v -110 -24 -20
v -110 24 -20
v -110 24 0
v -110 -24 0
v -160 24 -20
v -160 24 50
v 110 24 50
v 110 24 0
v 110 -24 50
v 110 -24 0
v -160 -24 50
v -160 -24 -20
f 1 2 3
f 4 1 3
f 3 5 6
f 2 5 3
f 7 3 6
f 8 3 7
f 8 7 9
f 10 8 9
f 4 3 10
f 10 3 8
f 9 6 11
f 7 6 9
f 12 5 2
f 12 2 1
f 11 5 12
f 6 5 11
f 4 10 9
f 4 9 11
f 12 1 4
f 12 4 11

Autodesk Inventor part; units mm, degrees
ref_plane "YZ Plane" through (0, 0, 0) normal (1, 0, 0) x (0, 1, 0)
ref_plane "XZ Plane" through (0, 0, 0) normal (0, 1, 0) x (-1, 0, 0)
ref_plane "XY Plane" through (0, 0, 0) normal (0, 0, 1) x (1, 0, 0)
sketch "Esboço1" plane through (0, 0, 0) normal (0, 0, 1) x (1, 0, 0)
  line L0 (-110, 24) -> (110, 24)
  line L1 (110, 24) -> (110, -24)
  line L2 (110, -24) -> (-110, -24)
  line L3 (-110, -24) -> (-110, 24)
  line L4 (-110, 24) -> (110, -24) construction
  line L5 (110, 24) -> (-110, -24) construction
  point P0 (0, 0)
  dimension "d0" = 220
  dimension "d1" = 48
extrude "Extrusão1" add sketch "Esboço1" along normal blind 50
sketch "Esboço2" plane through (-110, -24, 0) normal (-1, 0, 0) x (0, 0, 1)
  line L0 (50, 48) -> (50, 0) construction
  line L1 (0, 48) -> (50, 48) construction
  line L2 (50, 48) -> (50, 0) construction
  line L3 (50, 0) -> (0, 0) construction
  line L4 (0, 0) -> (0, 48) construction
  line L5 (0, 48) -> (50, 0) construction
  line L6 (50, 48) -> (0, 0) construction
  line L7 (0, 48) -> (-20, 48) construction
  line L8 (-20, 48) -> (-20, 0) construction
  line L9 (-20, 0) -> (0, 0) construction
  line L10 (-20, 24) -> (15, 24) construction
  line L11 (50, 48) -> (-20, 48)
  line L12 (-20, 48) -> (-20, 0)
  line L13 (-20, 0) -> (50, 0)
  line L14 (50, 0) -> (50, 48)
  line L15 (50, 48) -> (-20, 0) construction
  line L16 (-20, 48) -> (50, 0) construction
  point P0 (0, 24)
  point P1 (25, 24)
  dimension "d4" = 20
  dimension "d5" = 35
extrude "Extrusão2" add sketch "Esboço2" along normal blind 50
properties part number "ventilador_tangencial_referencia" material "Aço"
